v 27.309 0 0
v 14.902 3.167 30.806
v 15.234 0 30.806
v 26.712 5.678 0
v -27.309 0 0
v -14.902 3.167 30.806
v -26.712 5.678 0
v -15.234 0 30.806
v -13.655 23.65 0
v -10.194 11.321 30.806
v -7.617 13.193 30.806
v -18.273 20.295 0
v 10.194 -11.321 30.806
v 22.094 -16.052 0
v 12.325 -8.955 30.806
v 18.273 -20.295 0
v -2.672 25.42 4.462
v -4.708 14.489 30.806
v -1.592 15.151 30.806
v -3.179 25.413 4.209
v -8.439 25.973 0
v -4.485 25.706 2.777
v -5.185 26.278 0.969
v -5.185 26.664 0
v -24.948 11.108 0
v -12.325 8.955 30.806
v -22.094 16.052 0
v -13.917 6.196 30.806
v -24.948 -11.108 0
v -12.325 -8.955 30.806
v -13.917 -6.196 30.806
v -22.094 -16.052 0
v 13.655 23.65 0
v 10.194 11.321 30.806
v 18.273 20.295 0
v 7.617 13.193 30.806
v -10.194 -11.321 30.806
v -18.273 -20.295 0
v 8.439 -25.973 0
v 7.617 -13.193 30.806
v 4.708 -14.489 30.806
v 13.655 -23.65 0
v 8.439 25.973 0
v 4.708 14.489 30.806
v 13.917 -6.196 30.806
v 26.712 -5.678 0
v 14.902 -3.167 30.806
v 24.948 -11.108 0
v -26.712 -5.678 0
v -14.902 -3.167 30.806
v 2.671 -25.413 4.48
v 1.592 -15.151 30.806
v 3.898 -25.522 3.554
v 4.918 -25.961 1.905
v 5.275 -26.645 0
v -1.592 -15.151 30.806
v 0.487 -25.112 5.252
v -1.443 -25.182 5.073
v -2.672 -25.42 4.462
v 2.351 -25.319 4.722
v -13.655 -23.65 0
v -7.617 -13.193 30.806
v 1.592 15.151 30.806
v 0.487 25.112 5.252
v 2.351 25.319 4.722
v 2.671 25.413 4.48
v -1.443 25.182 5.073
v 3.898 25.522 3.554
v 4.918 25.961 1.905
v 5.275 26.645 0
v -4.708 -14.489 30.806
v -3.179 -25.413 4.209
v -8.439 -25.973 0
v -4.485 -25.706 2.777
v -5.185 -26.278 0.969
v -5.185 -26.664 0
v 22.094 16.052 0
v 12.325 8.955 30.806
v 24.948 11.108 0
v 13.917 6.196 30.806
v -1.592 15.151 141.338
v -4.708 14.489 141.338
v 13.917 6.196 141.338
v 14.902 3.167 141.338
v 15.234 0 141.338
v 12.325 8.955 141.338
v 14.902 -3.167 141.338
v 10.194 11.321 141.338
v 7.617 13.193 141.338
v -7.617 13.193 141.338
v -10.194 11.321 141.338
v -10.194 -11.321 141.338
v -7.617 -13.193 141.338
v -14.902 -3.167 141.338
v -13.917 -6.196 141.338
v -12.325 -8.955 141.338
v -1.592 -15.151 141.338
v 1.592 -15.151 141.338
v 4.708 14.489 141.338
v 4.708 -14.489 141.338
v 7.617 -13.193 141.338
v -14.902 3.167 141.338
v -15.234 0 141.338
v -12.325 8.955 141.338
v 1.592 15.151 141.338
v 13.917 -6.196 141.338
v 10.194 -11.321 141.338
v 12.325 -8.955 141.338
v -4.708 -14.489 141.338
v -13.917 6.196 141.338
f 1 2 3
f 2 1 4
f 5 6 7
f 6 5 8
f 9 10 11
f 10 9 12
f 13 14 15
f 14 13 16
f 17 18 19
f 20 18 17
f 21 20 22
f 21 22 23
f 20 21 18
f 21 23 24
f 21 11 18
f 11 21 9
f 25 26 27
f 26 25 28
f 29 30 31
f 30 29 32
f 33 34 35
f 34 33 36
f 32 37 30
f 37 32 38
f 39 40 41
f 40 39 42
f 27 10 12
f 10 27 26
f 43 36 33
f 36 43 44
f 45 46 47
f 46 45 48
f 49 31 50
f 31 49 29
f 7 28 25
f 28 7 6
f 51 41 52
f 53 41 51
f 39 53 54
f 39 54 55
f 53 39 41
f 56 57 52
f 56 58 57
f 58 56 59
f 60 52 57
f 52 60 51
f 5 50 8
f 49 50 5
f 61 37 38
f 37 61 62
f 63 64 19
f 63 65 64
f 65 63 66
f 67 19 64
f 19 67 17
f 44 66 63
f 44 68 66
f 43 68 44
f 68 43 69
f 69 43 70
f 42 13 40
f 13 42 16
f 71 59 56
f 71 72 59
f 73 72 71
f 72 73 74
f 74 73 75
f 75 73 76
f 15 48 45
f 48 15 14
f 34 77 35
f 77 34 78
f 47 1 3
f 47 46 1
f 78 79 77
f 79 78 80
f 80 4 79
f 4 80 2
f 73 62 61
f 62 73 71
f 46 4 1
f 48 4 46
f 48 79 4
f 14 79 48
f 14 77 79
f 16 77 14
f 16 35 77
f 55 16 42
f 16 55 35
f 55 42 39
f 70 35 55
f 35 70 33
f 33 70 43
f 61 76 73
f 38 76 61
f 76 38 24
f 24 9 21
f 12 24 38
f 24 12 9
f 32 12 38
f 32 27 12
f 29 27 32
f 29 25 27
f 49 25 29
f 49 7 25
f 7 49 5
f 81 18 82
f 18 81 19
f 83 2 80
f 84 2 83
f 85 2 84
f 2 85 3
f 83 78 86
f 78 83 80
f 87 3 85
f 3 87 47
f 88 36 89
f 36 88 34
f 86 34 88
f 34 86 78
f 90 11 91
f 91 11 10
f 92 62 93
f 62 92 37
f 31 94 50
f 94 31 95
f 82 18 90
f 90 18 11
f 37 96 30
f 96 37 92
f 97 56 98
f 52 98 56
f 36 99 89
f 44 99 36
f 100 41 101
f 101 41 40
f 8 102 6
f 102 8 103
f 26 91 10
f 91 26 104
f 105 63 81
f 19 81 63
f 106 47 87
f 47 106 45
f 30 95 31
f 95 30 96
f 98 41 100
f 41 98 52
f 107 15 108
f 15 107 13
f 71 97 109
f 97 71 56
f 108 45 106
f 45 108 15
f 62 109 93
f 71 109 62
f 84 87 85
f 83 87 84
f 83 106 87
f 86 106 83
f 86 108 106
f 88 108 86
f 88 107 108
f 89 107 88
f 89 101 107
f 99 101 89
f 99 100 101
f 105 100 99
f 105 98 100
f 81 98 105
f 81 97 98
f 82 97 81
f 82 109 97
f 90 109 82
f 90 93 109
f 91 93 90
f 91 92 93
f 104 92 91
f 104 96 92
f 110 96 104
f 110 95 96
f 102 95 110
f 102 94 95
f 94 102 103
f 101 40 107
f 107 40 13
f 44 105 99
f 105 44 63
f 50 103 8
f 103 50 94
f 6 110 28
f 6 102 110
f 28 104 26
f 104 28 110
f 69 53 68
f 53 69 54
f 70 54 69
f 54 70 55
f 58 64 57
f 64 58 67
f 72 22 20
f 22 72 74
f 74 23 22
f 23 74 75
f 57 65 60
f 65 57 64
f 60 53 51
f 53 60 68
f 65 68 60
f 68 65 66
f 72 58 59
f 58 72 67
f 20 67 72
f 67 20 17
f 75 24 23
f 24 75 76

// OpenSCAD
seed = 3;
seeds = rands(0,1000000,10,seed);
head_outer_radius = rands(25,50,1,seeds[0])[0];
head_inner_radius = rands(10,head_outer_radius*2/3,1,seeds[1])[0];
head_length = rands(40,80,1,seeds[2])[0];
bolt_length = rands(head_length*2,200,1,seeds[3])[0];
cylinder_size = rands(5, head_outer_radius/4,1, seeds[4])[0];

difference(){
    union(){
        cylinder(head_length,head_outer_radius,0);
        cylinder(bolt_length,head_inner_radius,head_inner_radius);
    }
    rotate([90, 0, 0]){
        cylinder(head_outer_radius*2, cylinder_size, cylinder_size, center=true);
    }
}
